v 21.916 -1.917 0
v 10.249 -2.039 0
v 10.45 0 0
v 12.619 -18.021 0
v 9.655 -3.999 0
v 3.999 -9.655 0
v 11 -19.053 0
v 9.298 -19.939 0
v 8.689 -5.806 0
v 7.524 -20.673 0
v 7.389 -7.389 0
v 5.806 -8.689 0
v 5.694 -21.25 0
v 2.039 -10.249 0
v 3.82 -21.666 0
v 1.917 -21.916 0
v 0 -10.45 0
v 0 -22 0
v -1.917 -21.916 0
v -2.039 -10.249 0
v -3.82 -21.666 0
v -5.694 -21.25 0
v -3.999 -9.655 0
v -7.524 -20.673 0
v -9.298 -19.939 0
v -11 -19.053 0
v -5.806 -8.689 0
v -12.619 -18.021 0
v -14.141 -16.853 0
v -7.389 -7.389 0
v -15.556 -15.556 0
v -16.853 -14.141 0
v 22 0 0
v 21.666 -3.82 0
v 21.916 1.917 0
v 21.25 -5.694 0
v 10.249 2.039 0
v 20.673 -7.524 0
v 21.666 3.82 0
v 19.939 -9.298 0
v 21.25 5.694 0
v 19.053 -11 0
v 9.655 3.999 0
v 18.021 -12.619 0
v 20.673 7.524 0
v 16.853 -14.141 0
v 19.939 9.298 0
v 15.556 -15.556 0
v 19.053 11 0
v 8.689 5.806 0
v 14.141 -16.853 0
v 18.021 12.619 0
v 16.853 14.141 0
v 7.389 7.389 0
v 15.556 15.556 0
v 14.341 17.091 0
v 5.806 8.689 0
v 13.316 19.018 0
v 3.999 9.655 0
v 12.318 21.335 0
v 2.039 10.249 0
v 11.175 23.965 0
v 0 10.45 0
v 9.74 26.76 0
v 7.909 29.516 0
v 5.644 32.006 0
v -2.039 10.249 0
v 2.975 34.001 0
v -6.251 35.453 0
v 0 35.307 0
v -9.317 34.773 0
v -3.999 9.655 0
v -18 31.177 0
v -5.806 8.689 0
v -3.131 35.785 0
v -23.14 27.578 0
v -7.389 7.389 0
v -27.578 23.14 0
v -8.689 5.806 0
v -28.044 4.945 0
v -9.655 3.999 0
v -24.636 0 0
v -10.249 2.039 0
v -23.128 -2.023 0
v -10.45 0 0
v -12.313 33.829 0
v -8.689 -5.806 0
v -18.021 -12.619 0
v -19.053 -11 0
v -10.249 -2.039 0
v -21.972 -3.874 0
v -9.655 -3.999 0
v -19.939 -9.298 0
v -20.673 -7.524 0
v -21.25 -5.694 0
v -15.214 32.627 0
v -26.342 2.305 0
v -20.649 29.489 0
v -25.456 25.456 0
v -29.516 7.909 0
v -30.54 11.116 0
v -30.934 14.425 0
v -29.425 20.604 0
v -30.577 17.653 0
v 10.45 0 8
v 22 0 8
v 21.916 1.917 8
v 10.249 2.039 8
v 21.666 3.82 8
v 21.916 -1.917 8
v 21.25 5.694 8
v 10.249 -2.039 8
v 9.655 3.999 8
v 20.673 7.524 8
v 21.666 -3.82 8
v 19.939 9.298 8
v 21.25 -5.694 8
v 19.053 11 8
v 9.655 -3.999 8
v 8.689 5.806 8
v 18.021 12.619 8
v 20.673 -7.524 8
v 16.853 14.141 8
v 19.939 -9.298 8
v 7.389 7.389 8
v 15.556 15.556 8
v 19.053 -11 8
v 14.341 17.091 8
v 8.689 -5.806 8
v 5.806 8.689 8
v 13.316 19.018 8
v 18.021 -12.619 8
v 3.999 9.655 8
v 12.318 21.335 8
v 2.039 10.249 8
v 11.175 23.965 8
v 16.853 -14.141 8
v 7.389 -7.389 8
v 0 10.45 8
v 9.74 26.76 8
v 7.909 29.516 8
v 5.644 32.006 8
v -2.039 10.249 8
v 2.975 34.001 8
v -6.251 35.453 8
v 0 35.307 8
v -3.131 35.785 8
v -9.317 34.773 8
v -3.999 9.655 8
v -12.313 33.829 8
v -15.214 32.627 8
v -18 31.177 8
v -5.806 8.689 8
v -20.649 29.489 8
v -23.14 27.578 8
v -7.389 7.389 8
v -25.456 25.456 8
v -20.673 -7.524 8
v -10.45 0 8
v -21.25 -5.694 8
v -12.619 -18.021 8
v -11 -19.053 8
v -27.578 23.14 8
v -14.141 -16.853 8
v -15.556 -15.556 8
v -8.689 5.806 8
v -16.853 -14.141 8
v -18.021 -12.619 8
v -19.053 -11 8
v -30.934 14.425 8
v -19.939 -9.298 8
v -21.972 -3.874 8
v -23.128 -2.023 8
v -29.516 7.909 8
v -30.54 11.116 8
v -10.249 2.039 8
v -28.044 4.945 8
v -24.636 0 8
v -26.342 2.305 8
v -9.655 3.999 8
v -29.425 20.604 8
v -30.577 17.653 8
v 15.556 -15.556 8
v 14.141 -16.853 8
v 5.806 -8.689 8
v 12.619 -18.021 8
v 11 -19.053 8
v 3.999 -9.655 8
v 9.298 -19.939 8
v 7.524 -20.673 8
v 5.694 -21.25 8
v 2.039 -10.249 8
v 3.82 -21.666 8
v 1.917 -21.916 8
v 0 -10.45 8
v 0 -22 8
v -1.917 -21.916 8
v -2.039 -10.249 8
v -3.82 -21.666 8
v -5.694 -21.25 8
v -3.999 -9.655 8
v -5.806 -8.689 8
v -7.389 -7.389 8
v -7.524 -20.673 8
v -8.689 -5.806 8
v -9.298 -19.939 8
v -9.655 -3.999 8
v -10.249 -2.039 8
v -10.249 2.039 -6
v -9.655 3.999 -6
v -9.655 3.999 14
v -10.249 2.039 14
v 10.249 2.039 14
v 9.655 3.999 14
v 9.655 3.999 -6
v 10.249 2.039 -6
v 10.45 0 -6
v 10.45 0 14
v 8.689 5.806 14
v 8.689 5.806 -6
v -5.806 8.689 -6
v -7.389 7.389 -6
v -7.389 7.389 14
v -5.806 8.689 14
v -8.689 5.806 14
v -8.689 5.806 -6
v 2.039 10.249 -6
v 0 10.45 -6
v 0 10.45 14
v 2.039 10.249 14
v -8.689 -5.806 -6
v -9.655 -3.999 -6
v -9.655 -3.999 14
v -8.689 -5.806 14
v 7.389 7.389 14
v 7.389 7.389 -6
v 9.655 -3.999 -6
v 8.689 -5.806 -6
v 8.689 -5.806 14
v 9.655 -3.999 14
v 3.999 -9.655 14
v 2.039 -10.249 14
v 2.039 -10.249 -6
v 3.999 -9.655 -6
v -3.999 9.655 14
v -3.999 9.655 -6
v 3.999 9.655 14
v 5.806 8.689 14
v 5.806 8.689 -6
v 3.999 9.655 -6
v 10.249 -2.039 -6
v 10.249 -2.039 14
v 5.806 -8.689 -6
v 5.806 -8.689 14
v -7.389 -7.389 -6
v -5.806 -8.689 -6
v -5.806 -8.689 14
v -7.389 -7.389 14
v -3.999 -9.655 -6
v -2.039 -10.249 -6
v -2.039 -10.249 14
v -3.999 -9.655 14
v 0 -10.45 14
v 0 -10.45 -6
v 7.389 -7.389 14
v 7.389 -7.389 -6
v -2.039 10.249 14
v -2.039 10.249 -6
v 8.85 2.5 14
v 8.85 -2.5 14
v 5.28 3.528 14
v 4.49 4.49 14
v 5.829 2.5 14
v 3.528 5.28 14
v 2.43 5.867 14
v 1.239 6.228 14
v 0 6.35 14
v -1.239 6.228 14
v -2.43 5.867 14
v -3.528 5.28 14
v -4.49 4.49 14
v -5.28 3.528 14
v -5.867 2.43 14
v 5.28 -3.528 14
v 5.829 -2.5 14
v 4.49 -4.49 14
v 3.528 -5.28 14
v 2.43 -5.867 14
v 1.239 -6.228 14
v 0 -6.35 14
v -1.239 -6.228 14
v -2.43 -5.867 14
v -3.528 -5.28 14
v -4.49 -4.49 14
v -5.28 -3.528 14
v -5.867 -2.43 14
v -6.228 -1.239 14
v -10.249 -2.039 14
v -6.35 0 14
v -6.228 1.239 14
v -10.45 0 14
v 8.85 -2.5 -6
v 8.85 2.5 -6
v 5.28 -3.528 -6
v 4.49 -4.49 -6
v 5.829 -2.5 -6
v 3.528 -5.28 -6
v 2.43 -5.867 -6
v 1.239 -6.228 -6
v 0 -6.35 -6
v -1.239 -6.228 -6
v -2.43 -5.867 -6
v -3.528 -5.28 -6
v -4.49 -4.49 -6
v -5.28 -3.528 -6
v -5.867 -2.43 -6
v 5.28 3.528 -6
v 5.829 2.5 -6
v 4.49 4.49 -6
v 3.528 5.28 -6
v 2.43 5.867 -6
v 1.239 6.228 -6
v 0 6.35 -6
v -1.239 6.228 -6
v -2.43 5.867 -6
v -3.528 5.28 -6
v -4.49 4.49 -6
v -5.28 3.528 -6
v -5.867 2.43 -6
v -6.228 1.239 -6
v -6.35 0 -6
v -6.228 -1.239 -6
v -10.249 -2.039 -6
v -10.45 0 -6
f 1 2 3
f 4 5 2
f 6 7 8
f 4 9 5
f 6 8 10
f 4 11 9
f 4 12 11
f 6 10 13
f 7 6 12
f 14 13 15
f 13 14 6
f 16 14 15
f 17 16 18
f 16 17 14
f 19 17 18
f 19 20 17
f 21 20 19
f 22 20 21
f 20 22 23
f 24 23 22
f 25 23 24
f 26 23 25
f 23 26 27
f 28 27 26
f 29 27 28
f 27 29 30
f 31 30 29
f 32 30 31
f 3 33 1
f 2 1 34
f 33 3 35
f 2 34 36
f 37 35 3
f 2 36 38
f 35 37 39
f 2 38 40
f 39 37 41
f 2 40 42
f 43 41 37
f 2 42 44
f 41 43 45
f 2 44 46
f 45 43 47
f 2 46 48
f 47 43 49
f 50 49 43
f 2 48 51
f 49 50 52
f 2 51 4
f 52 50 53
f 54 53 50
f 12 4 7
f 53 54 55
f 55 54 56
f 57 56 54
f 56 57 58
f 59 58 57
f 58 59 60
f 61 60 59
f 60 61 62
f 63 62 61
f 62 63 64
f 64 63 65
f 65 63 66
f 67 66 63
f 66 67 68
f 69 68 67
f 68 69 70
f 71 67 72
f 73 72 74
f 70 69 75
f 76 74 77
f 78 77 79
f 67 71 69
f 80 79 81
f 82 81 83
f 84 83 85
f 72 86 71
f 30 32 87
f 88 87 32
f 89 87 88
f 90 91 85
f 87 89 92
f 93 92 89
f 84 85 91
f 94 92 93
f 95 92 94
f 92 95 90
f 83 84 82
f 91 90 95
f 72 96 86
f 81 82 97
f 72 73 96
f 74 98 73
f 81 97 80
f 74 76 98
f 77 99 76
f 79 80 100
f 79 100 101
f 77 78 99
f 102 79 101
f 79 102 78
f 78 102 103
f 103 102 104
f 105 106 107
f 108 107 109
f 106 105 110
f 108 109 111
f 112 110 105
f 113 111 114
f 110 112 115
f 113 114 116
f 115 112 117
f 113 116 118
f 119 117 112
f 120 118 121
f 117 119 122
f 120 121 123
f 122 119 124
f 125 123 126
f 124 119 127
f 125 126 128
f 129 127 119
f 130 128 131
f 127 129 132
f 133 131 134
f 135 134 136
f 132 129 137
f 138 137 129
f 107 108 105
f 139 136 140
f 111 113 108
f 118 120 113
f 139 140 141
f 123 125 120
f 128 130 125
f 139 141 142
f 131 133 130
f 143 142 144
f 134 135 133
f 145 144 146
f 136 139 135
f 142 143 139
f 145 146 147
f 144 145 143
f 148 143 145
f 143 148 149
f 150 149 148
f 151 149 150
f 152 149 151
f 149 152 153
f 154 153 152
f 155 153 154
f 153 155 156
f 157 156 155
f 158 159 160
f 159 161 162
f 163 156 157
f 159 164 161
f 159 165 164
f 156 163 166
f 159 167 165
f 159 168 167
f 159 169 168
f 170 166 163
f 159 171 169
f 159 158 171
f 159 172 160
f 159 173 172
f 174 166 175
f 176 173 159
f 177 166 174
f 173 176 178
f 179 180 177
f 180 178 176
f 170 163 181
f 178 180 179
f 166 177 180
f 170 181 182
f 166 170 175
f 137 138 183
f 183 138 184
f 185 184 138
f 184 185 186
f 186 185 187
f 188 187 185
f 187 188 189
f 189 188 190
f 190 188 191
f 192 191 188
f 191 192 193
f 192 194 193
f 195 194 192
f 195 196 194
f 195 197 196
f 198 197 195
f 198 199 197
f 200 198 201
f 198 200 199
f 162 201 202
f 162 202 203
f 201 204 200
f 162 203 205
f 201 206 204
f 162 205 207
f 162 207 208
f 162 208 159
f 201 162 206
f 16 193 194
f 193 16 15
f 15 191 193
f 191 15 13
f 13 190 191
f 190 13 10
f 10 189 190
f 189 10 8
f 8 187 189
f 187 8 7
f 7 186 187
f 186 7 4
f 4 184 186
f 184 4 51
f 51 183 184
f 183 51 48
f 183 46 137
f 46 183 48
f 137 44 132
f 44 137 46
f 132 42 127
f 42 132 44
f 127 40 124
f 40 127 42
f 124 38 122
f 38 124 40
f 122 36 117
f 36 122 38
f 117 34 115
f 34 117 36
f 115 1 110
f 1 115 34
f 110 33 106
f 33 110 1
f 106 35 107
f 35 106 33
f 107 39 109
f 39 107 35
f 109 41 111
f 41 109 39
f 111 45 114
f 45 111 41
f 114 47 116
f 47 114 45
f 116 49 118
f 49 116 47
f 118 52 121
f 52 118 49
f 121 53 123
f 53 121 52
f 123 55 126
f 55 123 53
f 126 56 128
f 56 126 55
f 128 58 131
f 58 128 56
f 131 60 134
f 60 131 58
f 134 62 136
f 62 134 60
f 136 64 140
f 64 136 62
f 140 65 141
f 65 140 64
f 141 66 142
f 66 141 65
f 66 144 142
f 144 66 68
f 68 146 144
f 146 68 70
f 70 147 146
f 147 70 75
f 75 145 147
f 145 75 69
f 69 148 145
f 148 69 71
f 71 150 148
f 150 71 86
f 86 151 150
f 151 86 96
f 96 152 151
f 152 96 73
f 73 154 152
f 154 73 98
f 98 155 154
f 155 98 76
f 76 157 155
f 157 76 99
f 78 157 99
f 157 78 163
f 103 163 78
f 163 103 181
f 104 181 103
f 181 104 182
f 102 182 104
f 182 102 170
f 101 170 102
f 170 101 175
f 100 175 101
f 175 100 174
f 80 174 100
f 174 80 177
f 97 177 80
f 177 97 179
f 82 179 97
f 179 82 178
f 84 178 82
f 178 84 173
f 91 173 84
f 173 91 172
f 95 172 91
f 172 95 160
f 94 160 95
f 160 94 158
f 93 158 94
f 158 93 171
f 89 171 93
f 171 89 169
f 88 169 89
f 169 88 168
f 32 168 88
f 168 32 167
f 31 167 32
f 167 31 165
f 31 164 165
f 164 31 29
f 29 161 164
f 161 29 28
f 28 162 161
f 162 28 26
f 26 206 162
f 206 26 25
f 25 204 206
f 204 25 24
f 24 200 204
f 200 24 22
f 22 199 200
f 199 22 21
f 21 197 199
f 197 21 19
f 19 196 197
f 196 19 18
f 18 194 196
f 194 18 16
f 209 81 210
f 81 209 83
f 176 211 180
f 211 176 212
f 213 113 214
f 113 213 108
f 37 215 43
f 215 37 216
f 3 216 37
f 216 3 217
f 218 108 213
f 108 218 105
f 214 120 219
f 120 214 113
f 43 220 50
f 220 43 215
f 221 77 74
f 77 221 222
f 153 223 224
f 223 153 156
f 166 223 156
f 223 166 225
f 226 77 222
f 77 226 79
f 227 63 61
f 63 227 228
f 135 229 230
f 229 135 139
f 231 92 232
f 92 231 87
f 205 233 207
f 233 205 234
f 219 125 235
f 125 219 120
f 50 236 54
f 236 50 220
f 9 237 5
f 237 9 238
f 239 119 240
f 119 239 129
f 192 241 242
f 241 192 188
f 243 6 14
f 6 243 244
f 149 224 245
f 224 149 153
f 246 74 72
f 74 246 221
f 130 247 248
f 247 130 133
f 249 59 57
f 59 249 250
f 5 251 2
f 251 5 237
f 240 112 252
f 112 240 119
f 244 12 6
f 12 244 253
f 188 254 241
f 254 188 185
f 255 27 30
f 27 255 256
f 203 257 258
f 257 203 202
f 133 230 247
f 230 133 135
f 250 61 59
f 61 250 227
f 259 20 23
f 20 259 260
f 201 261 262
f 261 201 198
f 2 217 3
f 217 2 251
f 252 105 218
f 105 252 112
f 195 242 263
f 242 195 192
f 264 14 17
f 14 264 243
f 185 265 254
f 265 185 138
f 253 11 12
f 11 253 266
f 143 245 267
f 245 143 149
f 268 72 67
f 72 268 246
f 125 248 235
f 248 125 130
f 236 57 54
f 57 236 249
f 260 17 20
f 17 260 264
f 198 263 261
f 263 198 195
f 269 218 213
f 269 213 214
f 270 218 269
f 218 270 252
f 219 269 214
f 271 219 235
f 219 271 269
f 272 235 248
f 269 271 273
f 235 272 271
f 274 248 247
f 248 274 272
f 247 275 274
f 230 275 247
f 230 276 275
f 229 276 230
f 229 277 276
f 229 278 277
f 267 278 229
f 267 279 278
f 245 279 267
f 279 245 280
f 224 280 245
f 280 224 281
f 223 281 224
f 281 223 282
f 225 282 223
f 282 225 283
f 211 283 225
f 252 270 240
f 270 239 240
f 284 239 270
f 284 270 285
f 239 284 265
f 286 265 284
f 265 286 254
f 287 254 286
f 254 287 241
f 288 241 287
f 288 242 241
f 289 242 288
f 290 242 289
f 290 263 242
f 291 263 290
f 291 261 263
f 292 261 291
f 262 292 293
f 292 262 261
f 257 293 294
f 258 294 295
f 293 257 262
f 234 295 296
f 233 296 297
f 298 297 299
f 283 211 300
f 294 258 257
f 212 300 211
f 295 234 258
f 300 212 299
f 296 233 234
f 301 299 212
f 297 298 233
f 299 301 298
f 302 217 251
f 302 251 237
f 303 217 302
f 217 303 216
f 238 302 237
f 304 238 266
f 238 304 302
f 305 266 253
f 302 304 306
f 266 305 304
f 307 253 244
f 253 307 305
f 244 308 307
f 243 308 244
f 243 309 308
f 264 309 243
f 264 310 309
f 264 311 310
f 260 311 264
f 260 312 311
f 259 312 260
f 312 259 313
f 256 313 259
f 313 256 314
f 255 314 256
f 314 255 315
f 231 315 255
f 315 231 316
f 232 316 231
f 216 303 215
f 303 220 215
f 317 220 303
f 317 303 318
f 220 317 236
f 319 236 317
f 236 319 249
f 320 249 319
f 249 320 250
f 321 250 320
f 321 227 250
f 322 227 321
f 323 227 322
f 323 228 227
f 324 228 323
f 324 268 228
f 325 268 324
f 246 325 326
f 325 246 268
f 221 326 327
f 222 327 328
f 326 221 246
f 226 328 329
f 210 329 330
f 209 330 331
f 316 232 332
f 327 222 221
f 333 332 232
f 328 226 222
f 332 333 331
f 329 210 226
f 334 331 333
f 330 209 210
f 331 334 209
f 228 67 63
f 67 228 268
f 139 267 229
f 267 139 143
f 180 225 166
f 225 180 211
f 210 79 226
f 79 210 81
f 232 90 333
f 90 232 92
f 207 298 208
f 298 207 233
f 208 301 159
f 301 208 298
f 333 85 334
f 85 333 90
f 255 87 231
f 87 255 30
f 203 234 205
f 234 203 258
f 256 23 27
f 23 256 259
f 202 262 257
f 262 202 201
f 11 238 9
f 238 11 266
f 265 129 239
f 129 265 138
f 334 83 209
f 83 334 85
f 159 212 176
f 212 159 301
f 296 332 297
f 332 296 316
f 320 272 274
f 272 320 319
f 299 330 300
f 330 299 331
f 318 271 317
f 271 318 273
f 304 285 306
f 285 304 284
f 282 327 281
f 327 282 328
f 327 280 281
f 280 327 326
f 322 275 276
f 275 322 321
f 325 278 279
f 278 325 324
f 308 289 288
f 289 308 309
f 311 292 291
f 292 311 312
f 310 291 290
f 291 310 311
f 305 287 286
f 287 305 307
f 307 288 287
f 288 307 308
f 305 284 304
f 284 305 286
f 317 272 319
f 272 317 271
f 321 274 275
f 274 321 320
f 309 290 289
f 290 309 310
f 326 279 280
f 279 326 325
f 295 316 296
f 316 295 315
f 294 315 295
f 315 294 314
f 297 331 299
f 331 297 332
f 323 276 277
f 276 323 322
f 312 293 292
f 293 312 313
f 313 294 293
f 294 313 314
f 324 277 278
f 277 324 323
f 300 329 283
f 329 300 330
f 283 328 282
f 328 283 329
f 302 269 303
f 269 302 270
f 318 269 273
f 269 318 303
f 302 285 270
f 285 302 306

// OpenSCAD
$fn = 32;

// ----------------------------------------------------------------------
// Cam: base radius 22 mm with a 14 mm lift over 150 degrees
// ----------------------------------------------------------------------

// --- parameters (mm) ---
base_r = 22;              // base radius
lift = 14;                // lift height above the base radius
lift_span = 150;          // angular width of the lift
lift_start = 45;          // angle where the lift starts
cam_t = 8;                // cam plate thickness
hub_d = 20.9;             // hub diameter
hub_h = 20;               // hub height
bore_d = 12.7;            // bore
key_w = 5;                // keyway width
key_depth = 2.1;          // keyway depth

cam_profile = [[22, 0], [21.916, 1.917], [21.666, 3.82], [21.25, 5.694], [20.673, 7.524], [19.939, 9.298], [19.053, 11], [18.021, 12.619], [16.853, 14.141], [15.556, 15.556], [14.341, 17.091], [13.316, 19.018], [12.318, 21.335], [11.175, 23.965], [9.74, 26.76], [7.909, 29.516], [5.644, 32.006], [2.975, 34.001], [0, 35.307], [-3.131, 35.785], [-6.251, 35.453], [-9.317, 34.773], [-12.313, 33.829], [-15.214, 32.627], [-18, 31.177], [-20.649, 29.489], [-23.14, 27.578], [-25.456, 25.456], [-27.578, 23.14], [-29.425, 20.604], [-30.577, 17.653], [-30.934, 14.425], [-30.54, 11.116], [-29.516, 7.909], [-28.044, 4.945], [-26.342, 2.305], [-24.636, 0], [-23.128, -2.023], [-21.972, -3.874], [-21.25, -5.694], [-20.673, -7.524], [-19.939, -9.298], [-19.053, -11], [-18.021, -12.619], [-16.853, -14.141], [-15.556, -15.556], [-14.141, -16.853], [-12.619, -18.021], [-11, -19.053], [-9.298, -19.939], [-7.524, -20.673], [-5.694, -21.25], [-3.82, -21.666], [-1.917, -21.916], [0, -22], [1.917, -21.916], [3.82, -21.666], [5.694, -21.25], [7.524, -20.673], [9.298, -19.939], [11, -19.053], [12.619, -18.021], [14.141, -16.853], [15.556, -15.556], [16.853, -14.141], [18.021, -12.619], [19.053, -11], [19.939, -9.298], [20.673, -7.524], [21.25, -5.694], [21.666, -3.82], [21.916, -1.917]];

difference() {
  union() {
    linear_extrude(height = cam_t) polygon(cam_profile);
    /* hub, proud of the cam plate on both sides */
    translate([0, 0, -6]) cylinder(h = hub_h, d = hub_d);
  }
  /* bore through the hub, 2.5 mm clear on both faces */
  translate([0, 0, -8.5]) cylinder(h = hub_h + 5, d = bore_d);
  /* keyway, milled through the whole hub */
  translate([4.25, -2.5, -8.5]) cube([4.6, 5, 25]);
}
